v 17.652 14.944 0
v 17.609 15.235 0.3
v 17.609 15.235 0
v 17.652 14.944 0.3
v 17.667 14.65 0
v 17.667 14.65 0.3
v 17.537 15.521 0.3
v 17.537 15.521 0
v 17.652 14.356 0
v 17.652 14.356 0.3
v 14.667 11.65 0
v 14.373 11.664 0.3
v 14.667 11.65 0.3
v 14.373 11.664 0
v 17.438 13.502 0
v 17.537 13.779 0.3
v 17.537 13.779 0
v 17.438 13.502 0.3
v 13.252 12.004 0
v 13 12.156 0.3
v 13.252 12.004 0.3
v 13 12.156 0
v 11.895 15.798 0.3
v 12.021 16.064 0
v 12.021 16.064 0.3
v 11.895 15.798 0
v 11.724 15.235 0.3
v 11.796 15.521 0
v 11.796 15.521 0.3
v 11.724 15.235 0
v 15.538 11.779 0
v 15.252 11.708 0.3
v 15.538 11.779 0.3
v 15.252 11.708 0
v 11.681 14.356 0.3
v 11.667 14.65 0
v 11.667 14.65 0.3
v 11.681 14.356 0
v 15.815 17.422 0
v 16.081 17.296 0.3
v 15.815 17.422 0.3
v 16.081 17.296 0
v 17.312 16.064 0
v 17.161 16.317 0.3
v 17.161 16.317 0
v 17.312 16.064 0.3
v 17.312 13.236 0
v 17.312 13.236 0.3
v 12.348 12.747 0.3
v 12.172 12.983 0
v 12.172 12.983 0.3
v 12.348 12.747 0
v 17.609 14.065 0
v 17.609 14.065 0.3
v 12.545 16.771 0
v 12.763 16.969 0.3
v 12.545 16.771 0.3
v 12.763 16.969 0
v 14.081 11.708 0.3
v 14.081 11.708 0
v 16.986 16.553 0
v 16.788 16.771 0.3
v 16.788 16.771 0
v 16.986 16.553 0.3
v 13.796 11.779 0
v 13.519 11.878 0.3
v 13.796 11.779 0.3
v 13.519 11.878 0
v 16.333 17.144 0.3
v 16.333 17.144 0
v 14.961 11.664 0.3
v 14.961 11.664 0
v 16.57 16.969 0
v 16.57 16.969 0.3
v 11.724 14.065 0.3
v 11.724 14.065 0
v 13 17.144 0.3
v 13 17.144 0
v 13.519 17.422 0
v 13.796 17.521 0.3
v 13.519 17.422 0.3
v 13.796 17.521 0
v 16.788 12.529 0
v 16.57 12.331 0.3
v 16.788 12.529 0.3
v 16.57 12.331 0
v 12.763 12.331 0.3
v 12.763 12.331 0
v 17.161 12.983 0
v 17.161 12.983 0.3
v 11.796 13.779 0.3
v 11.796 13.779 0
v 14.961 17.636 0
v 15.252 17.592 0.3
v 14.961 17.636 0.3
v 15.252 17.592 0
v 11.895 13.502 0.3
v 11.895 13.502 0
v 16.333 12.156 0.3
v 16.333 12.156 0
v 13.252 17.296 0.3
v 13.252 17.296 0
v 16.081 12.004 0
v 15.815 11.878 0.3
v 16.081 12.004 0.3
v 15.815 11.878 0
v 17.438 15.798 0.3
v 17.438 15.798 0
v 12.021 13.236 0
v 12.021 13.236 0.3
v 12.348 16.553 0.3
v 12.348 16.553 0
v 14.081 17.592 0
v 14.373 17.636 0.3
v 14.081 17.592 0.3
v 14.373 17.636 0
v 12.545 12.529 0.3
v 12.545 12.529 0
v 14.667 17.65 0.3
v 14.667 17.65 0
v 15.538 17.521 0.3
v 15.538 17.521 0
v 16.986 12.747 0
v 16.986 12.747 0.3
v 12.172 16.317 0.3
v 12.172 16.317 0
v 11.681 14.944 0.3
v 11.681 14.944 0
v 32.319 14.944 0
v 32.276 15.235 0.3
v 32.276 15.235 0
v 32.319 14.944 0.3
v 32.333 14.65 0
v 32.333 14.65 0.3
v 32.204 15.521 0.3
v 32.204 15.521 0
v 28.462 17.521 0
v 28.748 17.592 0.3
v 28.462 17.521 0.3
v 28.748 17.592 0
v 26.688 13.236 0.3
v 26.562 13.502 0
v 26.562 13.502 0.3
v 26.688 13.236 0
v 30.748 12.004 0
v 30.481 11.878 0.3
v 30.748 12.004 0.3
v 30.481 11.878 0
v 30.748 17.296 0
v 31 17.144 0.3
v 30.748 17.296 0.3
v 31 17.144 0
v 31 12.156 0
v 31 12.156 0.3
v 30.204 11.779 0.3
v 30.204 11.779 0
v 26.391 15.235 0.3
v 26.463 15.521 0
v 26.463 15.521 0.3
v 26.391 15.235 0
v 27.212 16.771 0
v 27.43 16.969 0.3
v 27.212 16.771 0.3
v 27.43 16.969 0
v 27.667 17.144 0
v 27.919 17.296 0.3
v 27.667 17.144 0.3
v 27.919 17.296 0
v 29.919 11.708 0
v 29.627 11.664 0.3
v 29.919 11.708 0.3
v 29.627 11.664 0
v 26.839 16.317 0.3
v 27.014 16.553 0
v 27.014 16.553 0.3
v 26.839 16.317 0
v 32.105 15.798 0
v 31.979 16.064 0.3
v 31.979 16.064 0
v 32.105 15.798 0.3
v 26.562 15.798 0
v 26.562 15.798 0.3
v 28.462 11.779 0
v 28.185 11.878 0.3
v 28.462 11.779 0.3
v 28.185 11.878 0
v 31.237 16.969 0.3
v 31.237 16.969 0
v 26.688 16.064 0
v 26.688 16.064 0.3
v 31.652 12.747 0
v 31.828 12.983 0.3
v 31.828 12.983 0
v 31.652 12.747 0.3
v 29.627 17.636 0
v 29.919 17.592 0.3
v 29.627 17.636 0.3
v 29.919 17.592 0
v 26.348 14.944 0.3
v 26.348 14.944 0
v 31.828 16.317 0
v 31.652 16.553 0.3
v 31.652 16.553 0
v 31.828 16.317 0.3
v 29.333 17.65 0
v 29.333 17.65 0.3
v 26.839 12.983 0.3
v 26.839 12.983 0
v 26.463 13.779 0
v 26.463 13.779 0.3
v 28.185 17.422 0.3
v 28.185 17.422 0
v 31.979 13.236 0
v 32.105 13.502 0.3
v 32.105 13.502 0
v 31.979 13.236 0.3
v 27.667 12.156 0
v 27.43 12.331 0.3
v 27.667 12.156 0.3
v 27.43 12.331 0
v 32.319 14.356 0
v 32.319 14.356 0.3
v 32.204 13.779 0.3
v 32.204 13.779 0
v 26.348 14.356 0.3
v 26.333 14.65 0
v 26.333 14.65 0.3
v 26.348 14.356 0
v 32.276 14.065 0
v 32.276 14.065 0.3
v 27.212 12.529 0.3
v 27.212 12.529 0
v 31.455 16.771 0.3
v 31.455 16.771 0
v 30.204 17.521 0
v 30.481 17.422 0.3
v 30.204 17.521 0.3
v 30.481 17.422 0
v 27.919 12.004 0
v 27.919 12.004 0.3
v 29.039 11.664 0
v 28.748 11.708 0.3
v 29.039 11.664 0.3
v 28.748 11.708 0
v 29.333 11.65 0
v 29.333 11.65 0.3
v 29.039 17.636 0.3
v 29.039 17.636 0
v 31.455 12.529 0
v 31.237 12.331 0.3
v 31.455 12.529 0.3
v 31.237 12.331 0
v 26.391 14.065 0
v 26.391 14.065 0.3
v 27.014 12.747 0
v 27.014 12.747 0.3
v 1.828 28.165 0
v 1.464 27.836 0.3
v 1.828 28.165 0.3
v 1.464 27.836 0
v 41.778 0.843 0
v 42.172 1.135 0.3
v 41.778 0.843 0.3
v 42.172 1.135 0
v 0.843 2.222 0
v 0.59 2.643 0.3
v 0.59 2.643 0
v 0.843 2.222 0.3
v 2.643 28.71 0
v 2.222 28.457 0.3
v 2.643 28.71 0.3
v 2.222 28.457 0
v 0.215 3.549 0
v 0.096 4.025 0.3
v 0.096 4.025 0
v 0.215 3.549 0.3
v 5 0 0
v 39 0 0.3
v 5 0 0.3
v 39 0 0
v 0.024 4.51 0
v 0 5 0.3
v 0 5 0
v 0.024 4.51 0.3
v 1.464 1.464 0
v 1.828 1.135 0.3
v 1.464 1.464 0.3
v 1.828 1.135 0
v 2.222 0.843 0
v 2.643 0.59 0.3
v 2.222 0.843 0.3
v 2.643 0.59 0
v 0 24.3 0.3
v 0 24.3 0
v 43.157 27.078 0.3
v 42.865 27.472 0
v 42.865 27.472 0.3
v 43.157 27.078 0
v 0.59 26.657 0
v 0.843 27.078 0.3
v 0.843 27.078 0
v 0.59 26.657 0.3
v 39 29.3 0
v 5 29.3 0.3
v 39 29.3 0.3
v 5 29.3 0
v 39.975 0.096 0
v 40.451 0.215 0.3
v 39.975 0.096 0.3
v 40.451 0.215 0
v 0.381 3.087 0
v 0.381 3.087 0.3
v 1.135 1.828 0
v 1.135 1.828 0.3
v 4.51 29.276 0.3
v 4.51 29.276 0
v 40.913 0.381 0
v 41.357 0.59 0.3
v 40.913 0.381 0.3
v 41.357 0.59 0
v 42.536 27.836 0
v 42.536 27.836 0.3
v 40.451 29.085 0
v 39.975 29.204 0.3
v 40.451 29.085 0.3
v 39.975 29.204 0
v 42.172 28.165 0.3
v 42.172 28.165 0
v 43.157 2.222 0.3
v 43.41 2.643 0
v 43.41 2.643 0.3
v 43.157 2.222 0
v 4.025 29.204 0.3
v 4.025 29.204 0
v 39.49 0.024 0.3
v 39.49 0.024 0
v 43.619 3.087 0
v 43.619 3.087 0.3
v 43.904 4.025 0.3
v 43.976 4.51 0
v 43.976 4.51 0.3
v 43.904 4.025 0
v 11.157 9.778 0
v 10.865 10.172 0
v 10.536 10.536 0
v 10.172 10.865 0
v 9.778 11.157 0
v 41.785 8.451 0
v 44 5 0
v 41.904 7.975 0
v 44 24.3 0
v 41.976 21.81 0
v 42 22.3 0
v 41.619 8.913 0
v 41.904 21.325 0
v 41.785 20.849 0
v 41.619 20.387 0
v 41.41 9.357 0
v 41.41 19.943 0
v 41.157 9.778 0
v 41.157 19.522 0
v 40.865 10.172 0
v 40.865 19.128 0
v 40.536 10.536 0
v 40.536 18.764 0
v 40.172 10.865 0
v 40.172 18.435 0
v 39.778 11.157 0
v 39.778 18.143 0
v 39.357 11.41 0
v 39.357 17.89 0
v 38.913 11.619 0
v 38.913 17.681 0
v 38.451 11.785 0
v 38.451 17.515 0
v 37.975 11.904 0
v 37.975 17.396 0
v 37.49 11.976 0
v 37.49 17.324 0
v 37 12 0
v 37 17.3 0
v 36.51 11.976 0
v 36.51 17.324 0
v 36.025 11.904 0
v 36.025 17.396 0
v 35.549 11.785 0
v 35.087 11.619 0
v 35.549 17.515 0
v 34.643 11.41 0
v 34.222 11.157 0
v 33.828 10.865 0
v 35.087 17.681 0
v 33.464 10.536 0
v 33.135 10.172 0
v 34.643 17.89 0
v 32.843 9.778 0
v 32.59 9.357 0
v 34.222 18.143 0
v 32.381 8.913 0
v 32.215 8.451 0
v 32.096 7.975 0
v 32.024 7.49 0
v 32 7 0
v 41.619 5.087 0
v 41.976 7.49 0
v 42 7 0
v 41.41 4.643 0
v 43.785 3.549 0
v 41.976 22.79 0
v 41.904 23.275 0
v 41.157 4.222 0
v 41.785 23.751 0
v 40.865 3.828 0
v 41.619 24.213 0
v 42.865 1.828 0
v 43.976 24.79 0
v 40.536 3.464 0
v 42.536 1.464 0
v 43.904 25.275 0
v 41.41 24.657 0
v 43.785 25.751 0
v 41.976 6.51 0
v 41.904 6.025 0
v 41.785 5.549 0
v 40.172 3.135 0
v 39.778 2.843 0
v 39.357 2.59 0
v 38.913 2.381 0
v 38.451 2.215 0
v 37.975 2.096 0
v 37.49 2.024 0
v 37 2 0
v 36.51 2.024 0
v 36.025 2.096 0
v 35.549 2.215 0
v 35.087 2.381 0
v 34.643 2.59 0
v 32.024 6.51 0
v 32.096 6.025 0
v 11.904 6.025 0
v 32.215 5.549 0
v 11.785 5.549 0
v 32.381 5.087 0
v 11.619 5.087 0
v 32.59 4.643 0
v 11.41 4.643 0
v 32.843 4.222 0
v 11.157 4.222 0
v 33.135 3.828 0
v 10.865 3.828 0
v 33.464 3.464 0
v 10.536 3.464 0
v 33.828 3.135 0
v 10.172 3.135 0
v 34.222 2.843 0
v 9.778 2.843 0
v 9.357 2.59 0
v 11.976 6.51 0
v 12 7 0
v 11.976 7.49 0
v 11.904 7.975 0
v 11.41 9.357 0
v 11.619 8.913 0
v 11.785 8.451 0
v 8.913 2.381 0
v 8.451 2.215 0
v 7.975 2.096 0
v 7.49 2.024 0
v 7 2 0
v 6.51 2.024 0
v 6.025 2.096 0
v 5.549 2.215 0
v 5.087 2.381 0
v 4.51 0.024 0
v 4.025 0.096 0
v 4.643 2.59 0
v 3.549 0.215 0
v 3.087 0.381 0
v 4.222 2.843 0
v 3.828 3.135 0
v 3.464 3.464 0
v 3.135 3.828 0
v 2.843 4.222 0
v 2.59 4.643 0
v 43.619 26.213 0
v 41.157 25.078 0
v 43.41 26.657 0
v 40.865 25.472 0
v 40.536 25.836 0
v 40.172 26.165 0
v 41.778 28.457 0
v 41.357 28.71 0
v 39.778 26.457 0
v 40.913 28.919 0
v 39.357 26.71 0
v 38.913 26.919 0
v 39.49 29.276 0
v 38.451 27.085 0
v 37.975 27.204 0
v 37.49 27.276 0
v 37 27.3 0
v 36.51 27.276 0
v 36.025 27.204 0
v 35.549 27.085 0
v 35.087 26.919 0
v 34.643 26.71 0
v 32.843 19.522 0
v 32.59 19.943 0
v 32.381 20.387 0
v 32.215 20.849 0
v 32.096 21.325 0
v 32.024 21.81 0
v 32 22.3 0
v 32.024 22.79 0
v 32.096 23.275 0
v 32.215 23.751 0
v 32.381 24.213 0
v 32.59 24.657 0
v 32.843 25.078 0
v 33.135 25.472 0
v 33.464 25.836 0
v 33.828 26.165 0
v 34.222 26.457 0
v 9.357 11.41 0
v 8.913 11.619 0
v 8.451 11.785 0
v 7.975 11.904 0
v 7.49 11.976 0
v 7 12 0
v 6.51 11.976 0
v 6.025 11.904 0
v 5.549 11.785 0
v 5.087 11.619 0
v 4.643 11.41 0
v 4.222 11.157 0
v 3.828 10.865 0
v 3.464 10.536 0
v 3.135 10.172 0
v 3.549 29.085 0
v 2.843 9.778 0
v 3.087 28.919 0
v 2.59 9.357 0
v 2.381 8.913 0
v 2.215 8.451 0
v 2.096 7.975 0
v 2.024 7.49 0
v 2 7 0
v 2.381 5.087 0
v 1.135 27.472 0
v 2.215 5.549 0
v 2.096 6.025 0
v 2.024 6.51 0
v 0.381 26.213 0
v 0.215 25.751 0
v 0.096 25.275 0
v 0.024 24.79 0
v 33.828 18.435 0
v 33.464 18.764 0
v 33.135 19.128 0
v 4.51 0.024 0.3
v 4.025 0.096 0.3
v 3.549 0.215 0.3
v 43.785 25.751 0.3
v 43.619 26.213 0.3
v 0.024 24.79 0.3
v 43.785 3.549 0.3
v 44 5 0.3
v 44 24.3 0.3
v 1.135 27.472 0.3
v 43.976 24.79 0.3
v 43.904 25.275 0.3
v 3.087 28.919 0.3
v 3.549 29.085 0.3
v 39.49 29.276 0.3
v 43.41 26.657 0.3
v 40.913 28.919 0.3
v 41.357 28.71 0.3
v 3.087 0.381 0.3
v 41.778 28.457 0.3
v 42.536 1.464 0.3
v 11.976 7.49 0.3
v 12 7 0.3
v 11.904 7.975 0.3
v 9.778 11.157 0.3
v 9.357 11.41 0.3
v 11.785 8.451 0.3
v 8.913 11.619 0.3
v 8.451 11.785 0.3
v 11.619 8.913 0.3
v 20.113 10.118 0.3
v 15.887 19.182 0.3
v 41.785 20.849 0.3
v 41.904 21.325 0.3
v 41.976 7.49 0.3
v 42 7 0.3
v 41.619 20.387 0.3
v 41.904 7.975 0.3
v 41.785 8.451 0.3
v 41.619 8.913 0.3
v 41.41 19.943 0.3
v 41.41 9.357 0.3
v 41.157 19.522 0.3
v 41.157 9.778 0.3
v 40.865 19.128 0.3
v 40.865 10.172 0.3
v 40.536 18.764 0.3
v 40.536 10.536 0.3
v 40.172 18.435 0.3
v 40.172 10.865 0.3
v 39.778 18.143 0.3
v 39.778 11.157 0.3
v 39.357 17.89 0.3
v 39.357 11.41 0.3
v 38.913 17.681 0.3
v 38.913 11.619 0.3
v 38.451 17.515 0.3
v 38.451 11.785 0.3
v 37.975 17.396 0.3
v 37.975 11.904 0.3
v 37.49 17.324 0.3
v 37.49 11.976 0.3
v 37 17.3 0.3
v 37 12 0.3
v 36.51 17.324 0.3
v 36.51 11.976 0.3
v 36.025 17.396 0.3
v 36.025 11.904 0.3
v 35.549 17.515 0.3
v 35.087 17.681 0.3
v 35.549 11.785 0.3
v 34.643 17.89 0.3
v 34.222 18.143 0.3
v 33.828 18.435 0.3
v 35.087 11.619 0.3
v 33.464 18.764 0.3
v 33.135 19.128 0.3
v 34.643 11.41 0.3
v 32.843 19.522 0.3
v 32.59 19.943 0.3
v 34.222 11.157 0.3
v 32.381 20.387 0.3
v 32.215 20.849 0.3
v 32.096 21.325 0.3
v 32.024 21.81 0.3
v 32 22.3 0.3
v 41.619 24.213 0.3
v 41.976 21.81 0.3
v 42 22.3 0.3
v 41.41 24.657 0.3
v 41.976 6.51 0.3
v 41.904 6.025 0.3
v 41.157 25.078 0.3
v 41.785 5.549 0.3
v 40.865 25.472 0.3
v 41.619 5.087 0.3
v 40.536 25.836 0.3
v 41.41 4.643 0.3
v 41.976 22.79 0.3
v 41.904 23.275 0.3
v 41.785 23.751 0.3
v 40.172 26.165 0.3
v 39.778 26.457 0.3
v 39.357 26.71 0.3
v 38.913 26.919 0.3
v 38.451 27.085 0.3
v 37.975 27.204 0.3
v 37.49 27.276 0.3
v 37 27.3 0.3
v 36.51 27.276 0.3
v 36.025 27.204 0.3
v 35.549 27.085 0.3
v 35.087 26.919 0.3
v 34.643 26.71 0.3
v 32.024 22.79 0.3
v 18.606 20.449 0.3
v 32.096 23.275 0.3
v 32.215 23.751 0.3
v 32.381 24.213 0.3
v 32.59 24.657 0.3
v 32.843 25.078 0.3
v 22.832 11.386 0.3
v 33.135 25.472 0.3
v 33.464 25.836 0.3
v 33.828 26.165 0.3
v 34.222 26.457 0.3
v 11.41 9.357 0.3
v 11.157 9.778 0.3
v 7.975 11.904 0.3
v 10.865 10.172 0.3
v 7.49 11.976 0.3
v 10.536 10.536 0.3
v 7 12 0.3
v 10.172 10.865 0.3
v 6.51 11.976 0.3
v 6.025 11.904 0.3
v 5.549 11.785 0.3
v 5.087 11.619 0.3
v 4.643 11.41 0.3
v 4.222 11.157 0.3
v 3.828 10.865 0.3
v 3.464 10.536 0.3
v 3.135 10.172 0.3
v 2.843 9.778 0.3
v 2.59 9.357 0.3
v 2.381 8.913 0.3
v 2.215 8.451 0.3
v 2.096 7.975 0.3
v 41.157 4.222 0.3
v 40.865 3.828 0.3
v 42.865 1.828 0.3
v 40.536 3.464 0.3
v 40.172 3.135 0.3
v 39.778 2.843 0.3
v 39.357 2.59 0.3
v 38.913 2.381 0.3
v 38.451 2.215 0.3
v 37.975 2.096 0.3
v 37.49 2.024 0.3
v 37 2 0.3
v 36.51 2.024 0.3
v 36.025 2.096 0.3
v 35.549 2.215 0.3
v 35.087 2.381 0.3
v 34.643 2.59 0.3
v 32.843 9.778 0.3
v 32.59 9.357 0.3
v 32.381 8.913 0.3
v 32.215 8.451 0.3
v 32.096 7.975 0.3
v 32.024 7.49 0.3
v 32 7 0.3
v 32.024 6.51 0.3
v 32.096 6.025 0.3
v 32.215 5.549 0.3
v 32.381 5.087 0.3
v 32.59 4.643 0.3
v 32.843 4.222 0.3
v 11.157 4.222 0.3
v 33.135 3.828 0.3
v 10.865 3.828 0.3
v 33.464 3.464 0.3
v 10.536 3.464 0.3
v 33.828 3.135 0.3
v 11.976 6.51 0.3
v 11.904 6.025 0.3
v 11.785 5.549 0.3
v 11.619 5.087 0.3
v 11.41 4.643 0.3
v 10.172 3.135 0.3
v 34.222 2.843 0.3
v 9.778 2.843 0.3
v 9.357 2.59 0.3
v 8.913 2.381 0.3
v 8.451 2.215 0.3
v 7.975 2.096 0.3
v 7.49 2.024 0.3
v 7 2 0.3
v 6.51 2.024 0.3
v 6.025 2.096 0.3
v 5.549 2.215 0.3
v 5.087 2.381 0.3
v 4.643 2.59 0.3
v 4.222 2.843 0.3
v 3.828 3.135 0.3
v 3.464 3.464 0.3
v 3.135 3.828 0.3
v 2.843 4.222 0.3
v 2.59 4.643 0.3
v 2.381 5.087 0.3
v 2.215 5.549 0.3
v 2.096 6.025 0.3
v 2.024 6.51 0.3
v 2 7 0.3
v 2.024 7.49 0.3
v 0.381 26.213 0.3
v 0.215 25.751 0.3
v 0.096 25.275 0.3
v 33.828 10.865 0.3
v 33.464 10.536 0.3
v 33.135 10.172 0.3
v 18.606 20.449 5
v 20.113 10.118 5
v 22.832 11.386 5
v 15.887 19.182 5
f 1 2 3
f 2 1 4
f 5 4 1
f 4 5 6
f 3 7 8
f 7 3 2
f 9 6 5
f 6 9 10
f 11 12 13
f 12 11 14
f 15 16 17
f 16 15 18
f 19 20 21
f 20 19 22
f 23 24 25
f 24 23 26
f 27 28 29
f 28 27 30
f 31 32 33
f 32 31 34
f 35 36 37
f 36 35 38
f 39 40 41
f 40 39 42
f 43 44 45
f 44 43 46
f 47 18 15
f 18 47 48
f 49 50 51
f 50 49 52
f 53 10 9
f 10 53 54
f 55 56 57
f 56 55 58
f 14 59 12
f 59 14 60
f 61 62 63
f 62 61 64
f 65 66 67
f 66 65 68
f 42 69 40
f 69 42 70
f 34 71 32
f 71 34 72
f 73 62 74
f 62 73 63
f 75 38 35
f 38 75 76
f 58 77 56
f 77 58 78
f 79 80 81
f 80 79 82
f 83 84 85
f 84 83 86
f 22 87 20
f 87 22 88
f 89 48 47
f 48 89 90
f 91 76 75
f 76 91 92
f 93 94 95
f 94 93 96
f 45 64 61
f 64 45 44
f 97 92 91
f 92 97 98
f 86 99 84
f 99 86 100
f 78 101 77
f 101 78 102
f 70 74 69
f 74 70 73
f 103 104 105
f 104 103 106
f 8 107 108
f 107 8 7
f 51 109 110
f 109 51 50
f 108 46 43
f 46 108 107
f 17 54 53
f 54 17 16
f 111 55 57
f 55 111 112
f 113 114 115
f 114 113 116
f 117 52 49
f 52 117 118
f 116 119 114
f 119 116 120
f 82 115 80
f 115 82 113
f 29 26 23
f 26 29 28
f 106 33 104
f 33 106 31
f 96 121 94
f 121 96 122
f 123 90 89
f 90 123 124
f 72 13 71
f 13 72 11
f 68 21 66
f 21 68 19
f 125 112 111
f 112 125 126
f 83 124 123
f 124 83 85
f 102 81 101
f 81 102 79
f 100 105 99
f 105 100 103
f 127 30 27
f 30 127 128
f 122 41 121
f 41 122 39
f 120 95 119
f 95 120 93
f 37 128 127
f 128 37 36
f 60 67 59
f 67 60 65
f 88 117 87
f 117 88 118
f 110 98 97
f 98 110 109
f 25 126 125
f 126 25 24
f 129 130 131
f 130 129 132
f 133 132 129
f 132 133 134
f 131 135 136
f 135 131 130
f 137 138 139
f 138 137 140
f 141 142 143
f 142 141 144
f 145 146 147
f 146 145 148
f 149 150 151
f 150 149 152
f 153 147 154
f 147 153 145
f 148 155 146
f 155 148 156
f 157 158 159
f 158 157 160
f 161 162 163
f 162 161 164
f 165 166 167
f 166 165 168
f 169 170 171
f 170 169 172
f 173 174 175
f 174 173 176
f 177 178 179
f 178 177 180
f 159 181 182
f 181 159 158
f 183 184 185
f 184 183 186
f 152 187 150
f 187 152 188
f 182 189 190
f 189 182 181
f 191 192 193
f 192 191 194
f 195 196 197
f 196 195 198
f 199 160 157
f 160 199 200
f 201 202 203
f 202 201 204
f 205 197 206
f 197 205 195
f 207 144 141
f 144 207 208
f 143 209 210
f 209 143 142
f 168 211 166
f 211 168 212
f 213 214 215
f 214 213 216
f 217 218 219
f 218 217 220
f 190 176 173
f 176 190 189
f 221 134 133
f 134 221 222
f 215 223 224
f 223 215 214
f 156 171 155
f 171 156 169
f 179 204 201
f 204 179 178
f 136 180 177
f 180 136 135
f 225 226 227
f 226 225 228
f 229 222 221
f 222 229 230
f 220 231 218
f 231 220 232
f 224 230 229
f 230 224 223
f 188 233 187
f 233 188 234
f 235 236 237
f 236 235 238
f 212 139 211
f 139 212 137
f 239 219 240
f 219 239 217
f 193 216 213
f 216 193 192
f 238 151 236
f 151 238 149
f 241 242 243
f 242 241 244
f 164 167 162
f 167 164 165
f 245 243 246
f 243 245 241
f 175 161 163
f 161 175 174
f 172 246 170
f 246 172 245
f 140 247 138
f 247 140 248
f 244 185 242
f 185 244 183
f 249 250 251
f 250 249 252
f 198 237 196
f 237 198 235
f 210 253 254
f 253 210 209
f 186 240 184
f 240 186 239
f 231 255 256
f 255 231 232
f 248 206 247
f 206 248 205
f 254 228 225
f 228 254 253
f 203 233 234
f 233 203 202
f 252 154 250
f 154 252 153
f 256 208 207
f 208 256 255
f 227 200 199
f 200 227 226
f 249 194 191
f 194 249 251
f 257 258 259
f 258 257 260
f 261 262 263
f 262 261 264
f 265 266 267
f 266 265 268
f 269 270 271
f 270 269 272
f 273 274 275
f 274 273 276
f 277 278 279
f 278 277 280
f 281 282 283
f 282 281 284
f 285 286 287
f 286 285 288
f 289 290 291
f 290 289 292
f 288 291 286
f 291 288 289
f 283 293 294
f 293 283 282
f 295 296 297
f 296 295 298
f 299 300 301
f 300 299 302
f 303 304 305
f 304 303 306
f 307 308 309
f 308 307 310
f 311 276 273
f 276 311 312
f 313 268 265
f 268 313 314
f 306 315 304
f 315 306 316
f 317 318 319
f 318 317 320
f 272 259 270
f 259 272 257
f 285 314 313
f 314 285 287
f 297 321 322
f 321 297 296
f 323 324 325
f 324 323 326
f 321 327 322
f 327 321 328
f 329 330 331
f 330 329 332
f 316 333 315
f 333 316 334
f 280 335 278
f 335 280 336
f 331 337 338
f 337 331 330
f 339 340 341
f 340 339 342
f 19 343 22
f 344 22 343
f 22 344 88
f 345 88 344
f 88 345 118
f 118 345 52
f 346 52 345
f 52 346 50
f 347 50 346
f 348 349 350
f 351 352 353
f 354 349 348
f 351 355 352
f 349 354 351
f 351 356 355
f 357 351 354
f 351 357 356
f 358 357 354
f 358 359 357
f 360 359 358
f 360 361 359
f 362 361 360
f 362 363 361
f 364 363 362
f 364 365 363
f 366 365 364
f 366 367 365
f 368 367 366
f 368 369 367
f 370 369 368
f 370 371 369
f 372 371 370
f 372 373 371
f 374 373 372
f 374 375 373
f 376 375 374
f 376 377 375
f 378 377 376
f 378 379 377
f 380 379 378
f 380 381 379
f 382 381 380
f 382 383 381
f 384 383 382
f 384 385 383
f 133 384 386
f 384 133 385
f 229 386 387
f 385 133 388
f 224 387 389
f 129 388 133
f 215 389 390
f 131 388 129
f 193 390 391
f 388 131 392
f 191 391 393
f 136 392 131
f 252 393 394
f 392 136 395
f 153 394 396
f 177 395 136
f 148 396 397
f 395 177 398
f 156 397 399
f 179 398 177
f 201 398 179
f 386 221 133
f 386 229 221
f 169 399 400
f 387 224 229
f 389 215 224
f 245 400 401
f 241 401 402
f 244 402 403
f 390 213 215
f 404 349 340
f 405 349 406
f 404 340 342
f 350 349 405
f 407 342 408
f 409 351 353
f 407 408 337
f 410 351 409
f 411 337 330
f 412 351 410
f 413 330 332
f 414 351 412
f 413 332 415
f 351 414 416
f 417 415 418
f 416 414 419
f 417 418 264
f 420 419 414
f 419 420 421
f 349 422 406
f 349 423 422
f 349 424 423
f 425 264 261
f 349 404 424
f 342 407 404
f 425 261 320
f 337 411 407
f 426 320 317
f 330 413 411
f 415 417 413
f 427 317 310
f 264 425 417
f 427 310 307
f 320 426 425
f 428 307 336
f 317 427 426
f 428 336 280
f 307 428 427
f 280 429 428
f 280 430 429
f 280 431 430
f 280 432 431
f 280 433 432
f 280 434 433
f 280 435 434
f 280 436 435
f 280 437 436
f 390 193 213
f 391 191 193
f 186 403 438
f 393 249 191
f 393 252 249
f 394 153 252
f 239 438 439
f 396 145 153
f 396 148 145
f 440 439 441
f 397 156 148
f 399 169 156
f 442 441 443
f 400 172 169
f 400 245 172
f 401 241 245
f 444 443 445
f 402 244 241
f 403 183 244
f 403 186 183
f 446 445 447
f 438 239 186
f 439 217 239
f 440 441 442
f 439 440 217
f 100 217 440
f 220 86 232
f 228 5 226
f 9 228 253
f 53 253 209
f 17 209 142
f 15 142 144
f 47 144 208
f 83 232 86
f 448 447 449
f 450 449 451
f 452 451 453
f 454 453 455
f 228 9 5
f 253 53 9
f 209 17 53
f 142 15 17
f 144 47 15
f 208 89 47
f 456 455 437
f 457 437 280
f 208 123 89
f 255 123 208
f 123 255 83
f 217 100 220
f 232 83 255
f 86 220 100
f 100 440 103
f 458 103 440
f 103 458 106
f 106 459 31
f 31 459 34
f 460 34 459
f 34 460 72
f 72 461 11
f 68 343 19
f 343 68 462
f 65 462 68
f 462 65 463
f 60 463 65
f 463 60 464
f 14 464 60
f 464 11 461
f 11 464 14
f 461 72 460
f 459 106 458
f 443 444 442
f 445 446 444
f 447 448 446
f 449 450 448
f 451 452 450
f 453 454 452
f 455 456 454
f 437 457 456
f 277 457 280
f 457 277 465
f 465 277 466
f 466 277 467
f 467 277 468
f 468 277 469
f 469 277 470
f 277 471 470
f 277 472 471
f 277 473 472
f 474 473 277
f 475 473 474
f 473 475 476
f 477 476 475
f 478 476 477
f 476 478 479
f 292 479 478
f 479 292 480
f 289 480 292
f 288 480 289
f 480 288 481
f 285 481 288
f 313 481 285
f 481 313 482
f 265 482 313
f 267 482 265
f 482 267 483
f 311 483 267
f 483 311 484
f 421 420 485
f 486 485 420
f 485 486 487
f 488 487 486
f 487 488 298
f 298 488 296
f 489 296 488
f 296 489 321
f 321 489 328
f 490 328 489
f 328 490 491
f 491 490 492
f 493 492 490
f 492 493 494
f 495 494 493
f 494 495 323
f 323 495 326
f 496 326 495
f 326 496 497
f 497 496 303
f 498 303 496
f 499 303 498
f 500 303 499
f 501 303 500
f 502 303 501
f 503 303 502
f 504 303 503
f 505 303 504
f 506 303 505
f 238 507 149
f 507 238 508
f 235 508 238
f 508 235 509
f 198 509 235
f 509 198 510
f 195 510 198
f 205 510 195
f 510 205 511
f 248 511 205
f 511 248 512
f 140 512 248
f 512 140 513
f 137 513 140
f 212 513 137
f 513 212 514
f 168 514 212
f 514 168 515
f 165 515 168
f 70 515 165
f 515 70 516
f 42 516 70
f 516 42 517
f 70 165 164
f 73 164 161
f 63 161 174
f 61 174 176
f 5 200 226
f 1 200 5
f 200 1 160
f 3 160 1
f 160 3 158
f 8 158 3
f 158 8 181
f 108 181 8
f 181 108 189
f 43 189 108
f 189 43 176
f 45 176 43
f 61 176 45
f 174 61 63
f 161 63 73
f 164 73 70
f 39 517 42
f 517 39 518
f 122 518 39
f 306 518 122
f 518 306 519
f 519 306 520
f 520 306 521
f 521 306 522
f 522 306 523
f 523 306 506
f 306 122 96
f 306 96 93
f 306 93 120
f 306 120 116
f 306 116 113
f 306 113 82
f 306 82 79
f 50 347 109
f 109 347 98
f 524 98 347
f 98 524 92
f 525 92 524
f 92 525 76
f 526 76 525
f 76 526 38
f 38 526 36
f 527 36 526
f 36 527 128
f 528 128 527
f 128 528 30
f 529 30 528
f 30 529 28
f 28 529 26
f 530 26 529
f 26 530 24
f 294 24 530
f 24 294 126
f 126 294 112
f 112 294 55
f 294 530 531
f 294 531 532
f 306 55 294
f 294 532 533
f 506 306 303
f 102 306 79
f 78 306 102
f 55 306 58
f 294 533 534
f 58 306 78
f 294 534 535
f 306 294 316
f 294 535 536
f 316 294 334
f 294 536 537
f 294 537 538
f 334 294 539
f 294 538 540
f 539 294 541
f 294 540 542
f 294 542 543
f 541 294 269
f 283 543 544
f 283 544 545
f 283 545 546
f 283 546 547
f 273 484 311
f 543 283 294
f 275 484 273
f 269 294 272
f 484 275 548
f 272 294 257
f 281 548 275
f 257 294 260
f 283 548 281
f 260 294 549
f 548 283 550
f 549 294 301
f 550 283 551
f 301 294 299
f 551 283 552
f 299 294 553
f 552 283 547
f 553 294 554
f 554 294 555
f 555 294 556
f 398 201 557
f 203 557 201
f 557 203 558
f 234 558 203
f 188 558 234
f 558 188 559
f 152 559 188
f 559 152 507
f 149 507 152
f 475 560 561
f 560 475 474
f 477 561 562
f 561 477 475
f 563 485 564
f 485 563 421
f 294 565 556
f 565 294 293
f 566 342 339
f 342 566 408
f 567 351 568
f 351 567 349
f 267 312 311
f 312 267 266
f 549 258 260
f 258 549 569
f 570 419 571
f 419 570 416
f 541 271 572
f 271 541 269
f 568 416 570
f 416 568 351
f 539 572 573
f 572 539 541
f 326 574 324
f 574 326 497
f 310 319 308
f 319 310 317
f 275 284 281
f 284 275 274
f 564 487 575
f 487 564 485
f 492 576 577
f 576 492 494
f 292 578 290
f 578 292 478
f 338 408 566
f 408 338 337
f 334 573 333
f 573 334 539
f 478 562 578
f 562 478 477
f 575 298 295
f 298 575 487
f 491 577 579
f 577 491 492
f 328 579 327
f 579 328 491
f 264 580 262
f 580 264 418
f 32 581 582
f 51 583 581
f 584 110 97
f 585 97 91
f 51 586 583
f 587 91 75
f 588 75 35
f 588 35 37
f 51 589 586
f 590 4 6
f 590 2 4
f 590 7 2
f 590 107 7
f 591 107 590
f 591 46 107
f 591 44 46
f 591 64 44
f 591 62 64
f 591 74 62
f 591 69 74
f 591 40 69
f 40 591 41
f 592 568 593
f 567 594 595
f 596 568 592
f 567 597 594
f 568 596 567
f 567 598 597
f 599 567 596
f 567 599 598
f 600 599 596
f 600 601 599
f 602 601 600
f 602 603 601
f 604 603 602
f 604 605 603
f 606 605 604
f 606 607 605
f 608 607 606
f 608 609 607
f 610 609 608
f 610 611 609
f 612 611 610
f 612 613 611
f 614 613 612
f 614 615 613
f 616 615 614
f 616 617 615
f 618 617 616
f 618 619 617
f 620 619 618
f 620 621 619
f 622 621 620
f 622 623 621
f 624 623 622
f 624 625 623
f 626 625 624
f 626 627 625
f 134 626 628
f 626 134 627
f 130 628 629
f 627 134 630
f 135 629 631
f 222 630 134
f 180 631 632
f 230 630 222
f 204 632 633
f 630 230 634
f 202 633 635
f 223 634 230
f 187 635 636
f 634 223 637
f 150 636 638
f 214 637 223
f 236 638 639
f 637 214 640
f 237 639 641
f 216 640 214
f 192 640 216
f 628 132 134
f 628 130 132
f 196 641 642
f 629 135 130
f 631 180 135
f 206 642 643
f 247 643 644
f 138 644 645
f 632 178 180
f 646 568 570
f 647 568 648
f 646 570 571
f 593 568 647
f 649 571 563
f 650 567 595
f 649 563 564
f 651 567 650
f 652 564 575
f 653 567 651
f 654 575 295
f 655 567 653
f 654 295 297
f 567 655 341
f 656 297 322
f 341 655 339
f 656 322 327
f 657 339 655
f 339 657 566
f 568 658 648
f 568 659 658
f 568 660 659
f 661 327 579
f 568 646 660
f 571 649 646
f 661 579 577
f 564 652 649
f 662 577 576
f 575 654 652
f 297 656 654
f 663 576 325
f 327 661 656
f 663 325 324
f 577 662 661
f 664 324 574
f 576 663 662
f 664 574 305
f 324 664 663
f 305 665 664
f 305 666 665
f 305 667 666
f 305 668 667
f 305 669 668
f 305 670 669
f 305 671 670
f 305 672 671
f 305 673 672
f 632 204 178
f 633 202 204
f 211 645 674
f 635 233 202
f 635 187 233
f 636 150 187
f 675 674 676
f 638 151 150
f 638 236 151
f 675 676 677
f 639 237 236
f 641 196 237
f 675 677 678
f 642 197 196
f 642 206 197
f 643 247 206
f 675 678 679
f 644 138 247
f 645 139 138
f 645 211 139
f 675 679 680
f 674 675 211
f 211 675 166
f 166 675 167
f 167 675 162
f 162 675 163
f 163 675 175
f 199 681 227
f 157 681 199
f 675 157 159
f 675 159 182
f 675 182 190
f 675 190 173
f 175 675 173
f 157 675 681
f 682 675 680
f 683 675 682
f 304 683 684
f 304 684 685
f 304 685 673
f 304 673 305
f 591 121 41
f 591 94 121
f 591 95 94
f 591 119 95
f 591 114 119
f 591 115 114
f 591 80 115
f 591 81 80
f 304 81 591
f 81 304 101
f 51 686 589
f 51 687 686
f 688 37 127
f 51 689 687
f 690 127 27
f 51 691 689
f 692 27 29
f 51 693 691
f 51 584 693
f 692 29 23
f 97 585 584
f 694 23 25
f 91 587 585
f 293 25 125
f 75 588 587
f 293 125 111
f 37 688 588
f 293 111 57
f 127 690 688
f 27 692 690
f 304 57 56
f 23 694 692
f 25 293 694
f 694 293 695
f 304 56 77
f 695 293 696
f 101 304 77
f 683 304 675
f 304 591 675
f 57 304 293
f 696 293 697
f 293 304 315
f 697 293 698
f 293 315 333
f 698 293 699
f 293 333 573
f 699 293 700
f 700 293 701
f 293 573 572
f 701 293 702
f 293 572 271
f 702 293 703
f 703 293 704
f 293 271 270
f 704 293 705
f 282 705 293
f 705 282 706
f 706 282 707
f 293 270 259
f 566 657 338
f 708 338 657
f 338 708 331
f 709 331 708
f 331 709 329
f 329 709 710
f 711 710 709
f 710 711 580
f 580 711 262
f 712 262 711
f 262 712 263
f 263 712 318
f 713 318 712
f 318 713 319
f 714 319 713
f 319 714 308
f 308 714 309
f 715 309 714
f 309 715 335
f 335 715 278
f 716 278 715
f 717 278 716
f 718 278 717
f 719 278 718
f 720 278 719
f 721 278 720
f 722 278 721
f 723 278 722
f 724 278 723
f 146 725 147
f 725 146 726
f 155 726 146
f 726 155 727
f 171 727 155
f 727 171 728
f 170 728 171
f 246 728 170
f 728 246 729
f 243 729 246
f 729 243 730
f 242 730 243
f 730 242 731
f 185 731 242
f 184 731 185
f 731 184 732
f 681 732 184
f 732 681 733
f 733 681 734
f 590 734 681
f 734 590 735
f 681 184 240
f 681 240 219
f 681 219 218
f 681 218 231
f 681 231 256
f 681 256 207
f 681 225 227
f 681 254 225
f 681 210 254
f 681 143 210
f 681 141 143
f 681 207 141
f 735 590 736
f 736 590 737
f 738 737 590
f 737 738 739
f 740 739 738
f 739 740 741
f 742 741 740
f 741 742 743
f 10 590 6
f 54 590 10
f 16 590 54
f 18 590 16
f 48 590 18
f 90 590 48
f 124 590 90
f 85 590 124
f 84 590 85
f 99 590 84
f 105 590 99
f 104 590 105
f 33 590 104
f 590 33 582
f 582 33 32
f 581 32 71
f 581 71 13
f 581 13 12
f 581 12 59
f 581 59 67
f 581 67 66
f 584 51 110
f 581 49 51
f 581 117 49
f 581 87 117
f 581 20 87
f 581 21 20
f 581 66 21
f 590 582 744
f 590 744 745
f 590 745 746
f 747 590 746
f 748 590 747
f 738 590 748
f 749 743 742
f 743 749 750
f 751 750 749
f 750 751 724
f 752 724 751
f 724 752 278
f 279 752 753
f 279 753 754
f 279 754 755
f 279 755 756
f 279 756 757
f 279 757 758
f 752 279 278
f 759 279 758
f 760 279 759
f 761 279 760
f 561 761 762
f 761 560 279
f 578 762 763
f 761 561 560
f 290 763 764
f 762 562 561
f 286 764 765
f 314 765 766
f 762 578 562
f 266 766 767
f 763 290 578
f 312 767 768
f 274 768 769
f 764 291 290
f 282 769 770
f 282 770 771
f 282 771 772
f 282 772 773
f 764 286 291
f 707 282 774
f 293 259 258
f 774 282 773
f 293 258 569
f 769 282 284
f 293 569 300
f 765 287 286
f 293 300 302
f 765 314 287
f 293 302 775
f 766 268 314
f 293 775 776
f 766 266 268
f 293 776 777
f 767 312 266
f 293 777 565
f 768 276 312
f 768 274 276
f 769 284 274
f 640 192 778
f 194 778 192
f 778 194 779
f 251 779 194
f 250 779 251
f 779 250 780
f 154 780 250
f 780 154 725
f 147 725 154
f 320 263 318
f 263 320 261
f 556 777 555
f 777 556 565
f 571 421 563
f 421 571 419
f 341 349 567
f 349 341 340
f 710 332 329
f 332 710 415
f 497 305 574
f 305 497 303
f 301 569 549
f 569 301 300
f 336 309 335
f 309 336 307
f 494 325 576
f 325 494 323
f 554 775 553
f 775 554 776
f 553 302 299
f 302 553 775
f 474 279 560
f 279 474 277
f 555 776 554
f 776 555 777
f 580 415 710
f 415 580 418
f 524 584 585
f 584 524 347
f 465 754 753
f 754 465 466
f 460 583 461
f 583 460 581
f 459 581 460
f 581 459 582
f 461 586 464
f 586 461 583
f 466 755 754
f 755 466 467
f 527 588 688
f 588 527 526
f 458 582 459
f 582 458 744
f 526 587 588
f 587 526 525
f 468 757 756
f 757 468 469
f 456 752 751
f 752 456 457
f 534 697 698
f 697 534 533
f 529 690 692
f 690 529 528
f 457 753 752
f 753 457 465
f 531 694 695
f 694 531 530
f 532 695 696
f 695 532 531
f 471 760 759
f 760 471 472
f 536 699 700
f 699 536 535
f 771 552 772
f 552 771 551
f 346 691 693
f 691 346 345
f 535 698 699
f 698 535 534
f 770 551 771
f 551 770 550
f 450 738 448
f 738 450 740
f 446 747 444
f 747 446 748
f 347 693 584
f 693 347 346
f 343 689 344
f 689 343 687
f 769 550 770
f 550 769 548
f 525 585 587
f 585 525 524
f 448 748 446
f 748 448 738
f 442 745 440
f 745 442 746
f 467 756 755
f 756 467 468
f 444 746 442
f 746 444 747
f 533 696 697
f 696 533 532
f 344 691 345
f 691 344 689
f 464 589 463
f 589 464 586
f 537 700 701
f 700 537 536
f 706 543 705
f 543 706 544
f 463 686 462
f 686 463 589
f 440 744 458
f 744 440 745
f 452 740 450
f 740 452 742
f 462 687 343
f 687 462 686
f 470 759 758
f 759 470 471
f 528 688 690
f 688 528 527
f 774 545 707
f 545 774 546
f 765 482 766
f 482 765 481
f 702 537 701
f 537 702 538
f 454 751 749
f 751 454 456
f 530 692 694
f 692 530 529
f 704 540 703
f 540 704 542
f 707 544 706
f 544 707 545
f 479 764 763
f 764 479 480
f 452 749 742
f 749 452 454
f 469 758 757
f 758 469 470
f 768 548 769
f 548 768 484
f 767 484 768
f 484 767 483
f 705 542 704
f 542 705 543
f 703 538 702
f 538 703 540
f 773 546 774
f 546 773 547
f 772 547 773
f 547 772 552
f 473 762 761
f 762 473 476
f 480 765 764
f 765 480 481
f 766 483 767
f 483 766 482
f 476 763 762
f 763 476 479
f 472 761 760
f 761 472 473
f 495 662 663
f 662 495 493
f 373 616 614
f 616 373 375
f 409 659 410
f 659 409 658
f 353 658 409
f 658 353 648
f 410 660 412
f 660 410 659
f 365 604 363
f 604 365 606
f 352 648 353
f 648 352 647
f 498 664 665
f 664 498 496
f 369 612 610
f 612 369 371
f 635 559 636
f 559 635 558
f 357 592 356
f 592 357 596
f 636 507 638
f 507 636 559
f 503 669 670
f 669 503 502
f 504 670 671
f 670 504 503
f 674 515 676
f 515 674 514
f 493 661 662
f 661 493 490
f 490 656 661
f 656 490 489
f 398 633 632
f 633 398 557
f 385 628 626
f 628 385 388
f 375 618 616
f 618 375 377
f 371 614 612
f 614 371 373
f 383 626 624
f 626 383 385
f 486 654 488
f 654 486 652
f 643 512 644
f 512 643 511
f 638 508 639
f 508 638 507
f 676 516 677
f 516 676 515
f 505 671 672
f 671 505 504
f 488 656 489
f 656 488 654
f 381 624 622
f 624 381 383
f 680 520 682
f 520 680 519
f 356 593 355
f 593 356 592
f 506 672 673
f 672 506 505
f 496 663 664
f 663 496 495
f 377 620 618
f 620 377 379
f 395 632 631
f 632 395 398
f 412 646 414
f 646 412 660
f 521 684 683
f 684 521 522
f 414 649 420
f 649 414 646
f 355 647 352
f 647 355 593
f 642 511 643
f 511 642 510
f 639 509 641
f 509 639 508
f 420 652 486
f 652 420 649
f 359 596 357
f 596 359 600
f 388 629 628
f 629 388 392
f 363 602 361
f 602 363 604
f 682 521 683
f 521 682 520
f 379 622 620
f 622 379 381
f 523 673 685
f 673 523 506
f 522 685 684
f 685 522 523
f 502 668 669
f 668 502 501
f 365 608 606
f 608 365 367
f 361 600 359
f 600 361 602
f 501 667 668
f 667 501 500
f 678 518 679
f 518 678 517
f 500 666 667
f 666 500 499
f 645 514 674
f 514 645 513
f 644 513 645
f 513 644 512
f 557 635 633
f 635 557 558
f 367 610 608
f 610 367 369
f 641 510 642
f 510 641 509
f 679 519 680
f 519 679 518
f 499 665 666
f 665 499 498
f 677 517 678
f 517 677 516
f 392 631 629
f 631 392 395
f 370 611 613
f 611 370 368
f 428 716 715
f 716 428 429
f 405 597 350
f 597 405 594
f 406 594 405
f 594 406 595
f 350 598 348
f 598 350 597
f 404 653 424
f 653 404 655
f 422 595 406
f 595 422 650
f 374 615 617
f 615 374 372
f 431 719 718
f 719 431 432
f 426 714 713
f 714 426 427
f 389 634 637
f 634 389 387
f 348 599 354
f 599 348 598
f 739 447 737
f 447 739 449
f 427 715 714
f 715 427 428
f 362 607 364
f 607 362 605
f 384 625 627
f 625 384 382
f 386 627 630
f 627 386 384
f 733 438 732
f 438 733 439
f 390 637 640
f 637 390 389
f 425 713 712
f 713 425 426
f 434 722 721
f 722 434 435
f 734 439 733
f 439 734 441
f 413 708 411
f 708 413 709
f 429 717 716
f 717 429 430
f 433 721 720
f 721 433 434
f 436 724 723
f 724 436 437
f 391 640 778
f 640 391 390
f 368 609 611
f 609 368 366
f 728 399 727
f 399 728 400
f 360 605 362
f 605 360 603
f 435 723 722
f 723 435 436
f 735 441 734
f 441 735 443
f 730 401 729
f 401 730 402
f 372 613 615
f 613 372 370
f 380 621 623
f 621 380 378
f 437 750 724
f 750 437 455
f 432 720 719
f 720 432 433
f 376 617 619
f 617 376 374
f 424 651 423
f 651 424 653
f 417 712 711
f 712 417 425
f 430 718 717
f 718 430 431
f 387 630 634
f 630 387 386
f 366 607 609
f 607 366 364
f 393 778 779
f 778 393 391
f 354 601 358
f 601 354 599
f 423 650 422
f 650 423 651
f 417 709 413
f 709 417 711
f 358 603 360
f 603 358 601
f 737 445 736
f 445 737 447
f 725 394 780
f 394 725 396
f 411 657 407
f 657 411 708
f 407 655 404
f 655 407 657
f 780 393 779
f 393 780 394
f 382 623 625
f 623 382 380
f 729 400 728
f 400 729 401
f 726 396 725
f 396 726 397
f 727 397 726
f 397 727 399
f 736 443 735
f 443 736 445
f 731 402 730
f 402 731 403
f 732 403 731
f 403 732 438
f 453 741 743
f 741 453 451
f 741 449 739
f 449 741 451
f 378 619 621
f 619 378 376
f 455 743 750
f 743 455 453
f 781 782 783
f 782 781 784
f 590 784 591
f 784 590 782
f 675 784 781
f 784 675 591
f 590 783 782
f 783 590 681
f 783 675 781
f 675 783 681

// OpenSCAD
$fn=64;
corner_radius=5;
height=0.3;
plate_length=44;
plate_width=29.3;

contact_hole_radius=5;
contact_hole_distance=2;

pillar_hole_radius=3;

translate([corner_radius,corner_radius,0]) difference() {
    minkowski() {
        cube([plate_length-2 * corner_radius, plate_width-2 * corner_radius, height/2]);
        cylinder(r=corner_radius, h=height/2);
    }
    contact_hole(contact_hole_distance + contact_hole_radius, contact_hole_distance + contact_hole_radius);
    contact_hole(plate_length - contact_hole_distance - contact_hole_radius, plate_width - contact_hole_distance - contact_hole_radius);
    contact_hole(plate_length - contact_hole_distance - contact_hole_radius, contact_hole_distance + contact_hole_radius);
    translate([-corner_radius,-corner_radius,0]) union() {
        pillar(plate_length/3);
        pillar(plate_length*2/3);
    }
}

module contact_hole(x, y) {
    translate([x - corner_radius, y - corner_radius, -1]) cylinder(h=2, r=contact_hole_radius);
}

locator_width=3;
locator_length=10;
locator_height=5;
locator_rotation=25;
locator_distance=18;
translate([locator_distance, plate_width/2, 0]) rotate([0,0,locator_rotation]) translate([0,-locator_length/2,0]) cube([locator_width,locator_length,locator_height]);


module pillar(x) {
    translate([x, plate_width/2, -5]) cylinder(h=10, r=pillar_hole_radius);
}
